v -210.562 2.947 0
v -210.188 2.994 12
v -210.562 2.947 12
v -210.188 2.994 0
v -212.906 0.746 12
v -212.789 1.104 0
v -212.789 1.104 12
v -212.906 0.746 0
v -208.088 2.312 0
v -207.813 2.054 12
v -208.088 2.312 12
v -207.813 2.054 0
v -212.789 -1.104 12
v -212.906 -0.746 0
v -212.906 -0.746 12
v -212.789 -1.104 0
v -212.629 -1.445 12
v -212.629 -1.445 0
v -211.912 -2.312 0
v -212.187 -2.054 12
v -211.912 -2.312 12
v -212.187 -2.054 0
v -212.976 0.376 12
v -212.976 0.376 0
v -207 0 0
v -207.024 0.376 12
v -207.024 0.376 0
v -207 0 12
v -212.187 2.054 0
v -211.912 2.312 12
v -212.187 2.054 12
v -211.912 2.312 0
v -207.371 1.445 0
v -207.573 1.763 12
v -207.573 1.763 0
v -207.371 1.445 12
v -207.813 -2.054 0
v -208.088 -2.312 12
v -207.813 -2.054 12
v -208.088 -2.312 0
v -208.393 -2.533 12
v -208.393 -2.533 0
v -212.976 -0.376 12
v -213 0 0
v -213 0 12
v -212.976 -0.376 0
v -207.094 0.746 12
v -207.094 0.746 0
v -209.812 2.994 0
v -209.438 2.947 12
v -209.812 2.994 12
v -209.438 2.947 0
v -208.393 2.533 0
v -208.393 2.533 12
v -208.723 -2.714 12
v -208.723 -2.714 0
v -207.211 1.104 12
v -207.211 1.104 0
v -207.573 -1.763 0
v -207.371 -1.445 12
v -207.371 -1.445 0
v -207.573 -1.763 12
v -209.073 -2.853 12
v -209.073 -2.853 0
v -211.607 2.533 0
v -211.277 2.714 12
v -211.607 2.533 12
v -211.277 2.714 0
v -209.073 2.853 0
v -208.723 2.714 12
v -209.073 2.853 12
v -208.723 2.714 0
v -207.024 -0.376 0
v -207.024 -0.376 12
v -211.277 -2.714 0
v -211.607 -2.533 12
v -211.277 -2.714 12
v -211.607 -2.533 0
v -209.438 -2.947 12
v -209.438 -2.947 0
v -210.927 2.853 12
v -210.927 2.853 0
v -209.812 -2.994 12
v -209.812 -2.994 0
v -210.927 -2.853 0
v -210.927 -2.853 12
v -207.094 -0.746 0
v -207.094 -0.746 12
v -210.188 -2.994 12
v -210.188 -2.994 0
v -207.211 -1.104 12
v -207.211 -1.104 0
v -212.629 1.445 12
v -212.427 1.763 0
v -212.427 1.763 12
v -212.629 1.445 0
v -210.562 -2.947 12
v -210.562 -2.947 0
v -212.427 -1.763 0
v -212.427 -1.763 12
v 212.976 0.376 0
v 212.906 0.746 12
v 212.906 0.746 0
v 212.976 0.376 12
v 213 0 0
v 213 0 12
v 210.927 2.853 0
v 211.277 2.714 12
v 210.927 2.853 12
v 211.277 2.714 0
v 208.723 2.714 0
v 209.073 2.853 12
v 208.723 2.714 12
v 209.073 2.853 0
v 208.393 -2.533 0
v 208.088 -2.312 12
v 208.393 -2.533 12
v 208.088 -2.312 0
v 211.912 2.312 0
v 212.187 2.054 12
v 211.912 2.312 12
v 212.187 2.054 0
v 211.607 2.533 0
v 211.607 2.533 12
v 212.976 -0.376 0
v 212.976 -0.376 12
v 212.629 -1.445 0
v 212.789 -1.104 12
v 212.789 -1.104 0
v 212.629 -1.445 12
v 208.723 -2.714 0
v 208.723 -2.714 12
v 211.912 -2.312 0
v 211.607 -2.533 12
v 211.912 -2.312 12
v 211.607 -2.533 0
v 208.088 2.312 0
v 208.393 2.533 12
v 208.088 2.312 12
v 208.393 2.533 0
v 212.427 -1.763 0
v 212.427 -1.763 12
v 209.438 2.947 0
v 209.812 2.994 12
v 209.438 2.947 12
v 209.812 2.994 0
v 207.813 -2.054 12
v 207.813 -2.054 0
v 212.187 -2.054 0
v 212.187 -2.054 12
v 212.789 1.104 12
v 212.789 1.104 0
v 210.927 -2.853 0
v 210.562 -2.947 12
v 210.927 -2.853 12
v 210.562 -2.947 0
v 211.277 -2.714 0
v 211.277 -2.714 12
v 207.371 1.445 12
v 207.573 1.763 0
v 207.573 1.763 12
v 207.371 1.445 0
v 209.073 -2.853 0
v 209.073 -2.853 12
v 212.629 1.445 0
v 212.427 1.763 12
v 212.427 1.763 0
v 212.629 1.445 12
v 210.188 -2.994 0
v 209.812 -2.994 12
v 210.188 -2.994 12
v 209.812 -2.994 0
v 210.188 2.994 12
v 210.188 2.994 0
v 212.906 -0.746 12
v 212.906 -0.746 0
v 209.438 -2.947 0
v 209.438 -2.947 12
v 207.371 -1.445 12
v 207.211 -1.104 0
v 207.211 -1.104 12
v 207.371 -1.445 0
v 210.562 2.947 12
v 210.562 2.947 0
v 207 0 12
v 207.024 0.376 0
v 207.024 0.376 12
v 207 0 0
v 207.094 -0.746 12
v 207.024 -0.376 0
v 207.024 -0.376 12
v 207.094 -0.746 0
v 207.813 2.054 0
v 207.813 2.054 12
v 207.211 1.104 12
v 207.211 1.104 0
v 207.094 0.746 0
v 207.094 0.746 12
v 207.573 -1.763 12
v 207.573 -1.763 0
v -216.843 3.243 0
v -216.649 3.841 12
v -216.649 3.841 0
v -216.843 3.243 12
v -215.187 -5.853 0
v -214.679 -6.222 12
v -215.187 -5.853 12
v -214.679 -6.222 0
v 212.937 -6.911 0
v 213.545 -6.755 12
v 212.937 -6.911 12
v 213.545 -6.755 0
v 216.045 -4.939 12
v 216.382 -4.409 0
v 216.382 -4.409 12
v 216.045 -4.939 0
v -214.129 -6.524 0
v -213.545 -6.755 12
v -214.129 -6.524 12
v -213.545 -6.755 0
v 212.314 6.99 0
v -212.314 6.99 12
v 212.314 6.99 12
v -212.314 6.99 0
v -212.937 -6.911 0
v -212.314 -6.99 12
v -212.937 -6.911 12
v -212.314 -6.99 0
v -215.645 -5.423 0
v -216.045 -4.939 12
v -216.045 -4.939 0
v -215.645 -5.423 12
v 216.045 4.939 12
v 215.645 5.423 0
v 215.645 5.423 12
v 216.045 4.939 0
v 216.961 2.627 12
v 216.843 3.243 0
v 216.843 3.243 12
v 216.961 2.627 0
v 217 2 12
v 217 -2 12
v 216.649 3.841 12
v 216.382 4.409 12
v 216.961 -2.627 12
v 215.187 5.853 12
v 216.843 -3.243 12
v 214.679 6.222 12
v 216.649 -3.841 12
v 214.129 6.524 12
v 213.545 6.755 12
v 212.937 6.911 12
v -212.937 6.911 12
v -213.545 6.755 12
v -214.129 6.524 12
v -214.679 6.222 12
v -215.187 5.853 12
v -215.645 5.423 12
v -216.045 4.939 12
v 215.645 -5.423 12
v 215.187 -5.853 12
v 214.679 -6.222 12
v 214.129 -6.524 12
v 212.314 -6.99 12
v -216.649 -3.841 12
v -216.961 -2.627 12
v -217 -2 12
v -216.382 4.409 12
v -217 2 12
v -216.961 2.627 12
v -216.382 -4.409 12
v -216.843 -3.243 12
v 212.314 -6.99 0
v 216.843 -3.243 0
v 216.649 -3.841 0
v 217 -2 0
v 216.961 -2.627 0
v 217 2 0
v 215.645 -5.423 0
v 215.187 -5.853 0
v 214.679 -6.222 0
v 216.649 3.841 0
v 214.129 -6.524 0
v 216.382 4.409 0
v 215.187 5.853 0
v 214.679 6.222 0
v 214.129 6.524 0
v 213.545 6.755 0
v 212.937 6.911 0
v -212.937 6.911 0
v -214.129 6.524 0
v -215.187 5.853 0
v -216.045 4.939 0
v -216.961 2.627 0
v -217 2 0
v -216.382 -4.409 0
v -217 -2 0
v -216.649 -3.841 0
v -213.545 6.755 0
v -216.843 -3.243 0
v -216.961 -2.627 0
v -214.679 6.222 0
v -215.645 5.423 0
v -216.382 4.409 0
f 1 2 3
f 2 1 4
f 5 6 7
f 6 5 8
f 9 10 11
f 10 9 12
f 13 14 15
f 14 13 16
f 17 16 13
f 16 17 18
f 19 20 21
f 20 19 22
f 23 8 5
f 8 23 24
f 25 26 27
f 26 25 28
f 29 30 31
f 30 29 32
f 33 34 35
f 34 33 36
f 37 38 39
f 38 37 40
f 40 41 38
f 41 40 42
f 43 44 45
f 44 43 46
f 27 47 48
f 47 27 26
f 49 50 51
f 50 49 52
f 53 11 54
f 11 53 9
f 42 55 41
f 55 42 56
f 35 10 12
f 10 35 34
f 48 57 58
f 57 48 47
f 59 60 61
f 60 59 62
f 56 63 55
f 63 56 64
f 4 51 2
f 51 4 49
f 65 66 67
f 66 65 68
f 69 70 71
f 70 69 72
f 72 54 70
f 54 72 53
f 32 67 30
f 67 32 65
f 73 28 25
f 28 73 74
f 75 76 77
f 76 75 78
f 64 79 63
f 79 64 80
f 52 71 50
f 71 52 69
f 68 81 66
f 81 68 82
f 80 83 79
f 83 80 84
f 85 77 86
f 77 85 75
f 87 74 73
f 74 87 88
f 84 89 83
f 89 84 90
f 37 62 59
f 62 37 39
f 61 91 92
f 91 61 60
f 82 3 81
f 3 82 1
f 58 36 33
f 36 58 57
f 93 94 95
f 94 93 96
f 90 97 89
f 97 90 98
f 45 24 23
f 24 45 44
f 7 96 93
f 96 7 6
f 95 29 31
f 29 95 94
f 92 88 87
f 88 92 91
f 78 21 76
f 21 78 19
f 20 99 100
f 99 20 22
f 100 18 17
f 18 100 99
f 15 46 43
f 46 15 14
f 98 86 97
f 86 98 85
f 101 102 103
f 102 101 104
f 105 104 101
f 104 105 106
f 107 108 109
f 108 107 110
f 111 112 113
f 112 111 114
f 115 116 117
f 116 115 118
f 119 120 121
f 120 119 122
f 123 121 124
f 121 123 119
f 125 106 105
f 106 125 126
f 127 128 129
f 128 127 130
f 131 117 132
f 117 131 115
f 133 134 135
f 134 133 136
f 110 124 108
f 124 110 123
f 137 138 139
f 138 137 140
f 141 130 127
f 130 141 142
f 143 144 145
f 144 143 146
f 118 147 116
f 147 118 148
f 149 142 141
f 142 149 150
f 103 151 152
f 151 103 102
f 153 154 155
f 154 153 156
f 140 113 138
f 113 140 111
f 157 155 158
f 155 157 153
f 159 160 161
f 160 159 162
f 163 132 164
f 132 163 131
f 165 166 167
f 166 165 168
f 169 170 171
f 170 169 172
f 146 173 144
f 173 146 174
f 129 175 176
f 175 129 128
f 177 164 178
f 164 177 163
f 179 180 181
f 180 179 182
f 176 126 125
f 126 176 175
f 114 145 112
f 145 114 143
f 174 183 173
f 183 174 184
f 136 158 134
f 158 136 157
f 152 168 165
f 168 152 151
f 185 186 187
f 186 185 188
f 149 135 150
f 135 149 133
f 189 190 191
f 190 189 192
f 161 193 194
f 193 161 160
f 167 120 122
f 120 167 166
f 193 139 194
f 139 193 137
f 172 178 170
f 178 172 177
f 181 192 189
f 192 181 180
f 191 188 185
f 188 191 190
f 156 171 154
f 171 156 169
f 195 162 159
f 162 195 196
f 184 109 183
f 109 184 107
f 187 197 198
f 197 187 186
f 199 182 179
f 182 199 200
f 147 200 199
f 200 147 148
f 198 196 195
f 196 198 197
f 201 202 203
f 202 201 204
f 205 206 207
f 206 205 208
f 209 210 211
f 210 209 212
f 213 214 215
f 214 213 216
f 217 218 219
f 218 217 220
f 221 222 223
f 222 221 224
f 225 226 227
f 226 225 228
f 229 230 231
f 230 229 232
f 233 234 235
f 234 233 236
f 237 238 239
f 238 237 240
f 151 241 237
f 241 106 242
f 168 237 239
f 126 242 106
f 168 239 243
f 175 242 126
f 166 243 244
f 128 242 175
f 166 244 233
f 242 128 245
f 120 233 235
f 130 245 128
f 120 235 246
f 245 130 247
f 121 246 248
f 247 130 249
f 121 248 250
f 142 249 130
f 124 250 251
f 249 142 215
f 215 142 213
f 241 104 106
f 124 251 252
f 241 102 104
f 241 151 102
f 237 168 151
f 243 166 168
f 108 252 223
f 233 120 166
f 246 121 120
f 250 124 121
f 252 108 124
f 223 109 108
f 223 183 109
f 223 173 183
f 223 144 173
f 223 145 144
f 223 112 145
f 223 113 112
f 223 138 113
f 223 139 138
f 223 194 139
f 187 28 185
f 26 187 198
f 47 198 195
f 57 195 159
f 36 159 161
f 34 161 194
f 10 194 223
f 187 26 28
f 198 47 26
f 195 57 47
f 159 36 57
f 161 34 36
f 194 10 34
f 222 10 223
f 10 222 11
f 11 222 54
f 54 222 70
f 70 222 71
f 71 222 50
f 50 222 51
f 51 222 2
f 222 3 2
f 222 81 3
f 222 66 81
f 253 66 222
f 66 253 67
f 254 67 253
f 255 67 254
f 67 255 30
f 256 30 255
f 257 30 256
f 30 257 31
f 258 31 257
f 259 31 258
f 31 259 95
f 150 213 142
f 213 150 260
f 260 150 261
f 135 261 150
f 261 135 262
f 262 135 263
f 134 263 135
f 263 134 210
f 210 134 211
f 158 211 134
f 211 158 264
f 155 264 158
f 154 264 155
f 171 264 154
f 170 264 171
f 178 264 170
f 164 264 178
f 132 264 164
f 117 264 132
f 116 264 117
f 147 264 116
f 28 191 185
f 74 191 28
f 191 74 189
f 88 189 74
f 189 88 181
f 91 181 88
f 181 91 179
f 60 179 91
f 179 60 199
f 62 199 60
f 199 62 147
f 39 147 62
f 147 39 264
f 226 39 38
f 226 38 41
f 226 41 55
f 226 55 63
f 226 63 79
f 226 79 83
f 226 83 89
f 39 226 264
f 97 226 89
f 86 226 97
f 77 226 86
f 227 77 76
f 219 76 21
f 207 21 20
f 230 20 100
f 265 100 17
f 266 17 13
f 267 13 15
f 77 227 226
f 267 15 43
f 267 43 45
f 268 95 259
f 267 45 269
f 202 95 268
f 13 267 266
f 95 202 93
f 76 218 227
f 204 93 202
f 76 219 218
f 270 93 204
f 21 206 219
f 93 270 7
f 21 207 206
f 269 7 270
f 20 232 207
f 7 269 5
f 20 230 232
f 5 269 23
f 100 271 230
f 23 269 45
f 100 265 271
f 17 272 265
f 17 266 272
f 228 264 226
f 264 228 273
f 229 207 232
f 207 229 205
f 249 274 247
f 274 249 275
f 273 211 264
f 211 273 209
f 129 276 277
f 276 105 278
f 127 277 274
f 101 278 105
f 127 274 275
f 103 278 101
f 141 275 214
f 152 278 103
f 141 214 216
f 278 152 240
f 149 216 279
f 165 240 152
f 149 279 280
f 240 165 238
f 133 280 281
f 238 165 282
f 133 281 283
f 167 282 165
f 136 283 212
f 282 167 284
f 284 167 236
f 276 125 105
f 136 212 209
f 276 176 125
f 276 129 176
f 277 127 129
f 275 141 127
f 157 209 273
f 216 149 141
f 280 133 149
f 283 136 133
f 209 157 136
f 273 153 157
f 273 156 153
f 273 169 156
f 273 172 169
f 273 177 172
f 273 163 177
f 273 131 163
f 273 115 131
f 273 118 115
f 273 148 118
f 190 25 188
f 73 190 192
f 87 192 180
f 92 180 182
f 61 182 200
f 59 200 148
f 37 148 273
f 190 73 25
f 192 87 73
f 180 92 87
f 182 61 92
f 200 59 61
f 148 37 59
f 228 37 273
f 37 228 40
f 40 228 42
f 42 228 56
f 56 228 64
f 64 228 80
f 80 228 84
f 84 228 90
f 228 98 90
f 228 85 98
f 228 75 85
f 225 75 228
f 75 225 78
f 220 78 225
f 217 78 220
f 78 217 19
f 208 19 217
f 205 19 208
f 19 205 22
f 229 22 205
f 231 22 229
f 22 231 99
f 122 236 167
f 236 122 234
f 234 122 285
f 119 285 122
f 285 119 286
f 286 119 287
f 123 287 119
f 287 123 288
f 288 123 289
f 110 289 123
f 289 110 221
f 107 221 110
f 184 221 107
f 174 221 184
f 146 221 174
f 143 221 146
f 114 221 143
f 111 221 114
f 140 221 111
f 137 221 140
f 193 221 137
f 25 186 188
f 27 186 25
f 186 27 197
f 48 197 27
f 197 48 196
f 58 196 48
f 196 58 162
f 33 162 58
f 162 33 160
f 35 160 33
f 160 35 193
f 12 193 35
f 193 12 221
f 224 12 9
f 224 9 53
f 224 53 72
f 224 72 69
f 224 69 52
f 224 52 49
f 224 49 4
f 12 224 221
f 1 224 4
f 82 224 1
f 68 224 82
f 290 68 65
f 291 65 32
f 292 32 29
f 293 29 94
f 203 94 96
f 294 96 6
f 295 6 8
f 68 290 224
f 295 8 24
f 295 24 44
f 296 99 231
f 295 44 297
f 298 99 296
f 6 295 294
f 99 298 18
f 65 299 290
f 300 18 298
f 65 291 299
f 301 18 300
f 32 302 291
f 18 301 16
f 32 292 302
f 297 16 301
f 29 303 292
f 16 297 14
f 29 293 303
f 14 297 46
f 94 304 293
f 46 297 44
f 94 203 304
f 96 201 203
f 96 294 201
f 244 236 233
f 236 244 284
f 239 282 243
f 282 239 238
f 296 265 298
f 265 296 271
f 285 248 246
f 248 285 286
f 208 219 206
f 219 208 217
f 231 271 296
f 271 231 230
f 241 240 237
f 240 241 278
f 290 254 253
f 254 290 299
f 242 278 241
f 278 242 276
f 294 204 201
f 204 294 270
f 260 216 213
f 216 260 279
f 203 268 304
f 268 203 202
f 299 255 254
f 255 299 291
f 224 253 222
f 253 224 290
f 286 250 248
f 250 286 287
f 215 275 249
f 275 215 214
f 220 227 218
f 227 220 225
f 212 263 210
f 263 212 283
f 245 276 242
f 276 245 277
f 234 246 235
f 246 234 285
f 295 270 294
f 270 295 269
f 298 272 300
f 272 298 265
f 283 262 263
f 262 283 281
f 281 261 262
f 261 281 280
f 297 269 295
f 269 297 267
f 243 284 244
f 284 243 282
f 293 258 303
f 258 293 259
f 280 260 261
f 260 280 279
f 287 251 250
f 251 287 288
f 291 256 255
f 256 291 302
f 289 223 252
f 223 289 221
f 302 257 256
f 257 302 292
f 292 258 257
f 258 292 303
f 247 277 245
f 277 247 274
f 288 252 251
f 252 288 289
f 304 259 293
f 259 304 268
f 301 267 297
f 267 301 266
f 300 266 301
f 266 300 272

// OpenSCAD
$fn = 50;


difference() {
	union() {
		hull() {
			translate(v = [-212.0000000000, 2.0000000000, 0]) {
				cylinder(h = 12, r = 5);
			}
			translate(v = [212.0000000000, 2.0000000000, 0]) {
				cylinder(h = 12, r = 5);
			}
			translate(v = [-212.0000000000, -2.0000000000, 0]) {
				cylinder(h = 12, r = 5);
			}
			translate(v = [212.0000000000, -2.0000000000, 0]) {
				cylinder(h = 12, r = 5);
			}
		}
	}
	union() {
		translate(v = [-210.0000000000, 0.0000000000, -100.0000000000]) {
			cylinder(h = 200, r = 3.0000000000);
		}
		translate(v = [-210.0000000000, 0.0000000000, -100.0000000000]) {
			cylinder(h = 200, r = 3.0000000000);
		}
		translate(v = [210.0000000000, 0.0000000000, -100.0000000000]) {
			cylinder(h = 200, r = 3.0000000000);
		}
		translate(v = [210.0000000000, 0.0000000000, -100.0000000000]) {
			cylinder(h = 200, r = 3.0000000000);
		}
	}
}
